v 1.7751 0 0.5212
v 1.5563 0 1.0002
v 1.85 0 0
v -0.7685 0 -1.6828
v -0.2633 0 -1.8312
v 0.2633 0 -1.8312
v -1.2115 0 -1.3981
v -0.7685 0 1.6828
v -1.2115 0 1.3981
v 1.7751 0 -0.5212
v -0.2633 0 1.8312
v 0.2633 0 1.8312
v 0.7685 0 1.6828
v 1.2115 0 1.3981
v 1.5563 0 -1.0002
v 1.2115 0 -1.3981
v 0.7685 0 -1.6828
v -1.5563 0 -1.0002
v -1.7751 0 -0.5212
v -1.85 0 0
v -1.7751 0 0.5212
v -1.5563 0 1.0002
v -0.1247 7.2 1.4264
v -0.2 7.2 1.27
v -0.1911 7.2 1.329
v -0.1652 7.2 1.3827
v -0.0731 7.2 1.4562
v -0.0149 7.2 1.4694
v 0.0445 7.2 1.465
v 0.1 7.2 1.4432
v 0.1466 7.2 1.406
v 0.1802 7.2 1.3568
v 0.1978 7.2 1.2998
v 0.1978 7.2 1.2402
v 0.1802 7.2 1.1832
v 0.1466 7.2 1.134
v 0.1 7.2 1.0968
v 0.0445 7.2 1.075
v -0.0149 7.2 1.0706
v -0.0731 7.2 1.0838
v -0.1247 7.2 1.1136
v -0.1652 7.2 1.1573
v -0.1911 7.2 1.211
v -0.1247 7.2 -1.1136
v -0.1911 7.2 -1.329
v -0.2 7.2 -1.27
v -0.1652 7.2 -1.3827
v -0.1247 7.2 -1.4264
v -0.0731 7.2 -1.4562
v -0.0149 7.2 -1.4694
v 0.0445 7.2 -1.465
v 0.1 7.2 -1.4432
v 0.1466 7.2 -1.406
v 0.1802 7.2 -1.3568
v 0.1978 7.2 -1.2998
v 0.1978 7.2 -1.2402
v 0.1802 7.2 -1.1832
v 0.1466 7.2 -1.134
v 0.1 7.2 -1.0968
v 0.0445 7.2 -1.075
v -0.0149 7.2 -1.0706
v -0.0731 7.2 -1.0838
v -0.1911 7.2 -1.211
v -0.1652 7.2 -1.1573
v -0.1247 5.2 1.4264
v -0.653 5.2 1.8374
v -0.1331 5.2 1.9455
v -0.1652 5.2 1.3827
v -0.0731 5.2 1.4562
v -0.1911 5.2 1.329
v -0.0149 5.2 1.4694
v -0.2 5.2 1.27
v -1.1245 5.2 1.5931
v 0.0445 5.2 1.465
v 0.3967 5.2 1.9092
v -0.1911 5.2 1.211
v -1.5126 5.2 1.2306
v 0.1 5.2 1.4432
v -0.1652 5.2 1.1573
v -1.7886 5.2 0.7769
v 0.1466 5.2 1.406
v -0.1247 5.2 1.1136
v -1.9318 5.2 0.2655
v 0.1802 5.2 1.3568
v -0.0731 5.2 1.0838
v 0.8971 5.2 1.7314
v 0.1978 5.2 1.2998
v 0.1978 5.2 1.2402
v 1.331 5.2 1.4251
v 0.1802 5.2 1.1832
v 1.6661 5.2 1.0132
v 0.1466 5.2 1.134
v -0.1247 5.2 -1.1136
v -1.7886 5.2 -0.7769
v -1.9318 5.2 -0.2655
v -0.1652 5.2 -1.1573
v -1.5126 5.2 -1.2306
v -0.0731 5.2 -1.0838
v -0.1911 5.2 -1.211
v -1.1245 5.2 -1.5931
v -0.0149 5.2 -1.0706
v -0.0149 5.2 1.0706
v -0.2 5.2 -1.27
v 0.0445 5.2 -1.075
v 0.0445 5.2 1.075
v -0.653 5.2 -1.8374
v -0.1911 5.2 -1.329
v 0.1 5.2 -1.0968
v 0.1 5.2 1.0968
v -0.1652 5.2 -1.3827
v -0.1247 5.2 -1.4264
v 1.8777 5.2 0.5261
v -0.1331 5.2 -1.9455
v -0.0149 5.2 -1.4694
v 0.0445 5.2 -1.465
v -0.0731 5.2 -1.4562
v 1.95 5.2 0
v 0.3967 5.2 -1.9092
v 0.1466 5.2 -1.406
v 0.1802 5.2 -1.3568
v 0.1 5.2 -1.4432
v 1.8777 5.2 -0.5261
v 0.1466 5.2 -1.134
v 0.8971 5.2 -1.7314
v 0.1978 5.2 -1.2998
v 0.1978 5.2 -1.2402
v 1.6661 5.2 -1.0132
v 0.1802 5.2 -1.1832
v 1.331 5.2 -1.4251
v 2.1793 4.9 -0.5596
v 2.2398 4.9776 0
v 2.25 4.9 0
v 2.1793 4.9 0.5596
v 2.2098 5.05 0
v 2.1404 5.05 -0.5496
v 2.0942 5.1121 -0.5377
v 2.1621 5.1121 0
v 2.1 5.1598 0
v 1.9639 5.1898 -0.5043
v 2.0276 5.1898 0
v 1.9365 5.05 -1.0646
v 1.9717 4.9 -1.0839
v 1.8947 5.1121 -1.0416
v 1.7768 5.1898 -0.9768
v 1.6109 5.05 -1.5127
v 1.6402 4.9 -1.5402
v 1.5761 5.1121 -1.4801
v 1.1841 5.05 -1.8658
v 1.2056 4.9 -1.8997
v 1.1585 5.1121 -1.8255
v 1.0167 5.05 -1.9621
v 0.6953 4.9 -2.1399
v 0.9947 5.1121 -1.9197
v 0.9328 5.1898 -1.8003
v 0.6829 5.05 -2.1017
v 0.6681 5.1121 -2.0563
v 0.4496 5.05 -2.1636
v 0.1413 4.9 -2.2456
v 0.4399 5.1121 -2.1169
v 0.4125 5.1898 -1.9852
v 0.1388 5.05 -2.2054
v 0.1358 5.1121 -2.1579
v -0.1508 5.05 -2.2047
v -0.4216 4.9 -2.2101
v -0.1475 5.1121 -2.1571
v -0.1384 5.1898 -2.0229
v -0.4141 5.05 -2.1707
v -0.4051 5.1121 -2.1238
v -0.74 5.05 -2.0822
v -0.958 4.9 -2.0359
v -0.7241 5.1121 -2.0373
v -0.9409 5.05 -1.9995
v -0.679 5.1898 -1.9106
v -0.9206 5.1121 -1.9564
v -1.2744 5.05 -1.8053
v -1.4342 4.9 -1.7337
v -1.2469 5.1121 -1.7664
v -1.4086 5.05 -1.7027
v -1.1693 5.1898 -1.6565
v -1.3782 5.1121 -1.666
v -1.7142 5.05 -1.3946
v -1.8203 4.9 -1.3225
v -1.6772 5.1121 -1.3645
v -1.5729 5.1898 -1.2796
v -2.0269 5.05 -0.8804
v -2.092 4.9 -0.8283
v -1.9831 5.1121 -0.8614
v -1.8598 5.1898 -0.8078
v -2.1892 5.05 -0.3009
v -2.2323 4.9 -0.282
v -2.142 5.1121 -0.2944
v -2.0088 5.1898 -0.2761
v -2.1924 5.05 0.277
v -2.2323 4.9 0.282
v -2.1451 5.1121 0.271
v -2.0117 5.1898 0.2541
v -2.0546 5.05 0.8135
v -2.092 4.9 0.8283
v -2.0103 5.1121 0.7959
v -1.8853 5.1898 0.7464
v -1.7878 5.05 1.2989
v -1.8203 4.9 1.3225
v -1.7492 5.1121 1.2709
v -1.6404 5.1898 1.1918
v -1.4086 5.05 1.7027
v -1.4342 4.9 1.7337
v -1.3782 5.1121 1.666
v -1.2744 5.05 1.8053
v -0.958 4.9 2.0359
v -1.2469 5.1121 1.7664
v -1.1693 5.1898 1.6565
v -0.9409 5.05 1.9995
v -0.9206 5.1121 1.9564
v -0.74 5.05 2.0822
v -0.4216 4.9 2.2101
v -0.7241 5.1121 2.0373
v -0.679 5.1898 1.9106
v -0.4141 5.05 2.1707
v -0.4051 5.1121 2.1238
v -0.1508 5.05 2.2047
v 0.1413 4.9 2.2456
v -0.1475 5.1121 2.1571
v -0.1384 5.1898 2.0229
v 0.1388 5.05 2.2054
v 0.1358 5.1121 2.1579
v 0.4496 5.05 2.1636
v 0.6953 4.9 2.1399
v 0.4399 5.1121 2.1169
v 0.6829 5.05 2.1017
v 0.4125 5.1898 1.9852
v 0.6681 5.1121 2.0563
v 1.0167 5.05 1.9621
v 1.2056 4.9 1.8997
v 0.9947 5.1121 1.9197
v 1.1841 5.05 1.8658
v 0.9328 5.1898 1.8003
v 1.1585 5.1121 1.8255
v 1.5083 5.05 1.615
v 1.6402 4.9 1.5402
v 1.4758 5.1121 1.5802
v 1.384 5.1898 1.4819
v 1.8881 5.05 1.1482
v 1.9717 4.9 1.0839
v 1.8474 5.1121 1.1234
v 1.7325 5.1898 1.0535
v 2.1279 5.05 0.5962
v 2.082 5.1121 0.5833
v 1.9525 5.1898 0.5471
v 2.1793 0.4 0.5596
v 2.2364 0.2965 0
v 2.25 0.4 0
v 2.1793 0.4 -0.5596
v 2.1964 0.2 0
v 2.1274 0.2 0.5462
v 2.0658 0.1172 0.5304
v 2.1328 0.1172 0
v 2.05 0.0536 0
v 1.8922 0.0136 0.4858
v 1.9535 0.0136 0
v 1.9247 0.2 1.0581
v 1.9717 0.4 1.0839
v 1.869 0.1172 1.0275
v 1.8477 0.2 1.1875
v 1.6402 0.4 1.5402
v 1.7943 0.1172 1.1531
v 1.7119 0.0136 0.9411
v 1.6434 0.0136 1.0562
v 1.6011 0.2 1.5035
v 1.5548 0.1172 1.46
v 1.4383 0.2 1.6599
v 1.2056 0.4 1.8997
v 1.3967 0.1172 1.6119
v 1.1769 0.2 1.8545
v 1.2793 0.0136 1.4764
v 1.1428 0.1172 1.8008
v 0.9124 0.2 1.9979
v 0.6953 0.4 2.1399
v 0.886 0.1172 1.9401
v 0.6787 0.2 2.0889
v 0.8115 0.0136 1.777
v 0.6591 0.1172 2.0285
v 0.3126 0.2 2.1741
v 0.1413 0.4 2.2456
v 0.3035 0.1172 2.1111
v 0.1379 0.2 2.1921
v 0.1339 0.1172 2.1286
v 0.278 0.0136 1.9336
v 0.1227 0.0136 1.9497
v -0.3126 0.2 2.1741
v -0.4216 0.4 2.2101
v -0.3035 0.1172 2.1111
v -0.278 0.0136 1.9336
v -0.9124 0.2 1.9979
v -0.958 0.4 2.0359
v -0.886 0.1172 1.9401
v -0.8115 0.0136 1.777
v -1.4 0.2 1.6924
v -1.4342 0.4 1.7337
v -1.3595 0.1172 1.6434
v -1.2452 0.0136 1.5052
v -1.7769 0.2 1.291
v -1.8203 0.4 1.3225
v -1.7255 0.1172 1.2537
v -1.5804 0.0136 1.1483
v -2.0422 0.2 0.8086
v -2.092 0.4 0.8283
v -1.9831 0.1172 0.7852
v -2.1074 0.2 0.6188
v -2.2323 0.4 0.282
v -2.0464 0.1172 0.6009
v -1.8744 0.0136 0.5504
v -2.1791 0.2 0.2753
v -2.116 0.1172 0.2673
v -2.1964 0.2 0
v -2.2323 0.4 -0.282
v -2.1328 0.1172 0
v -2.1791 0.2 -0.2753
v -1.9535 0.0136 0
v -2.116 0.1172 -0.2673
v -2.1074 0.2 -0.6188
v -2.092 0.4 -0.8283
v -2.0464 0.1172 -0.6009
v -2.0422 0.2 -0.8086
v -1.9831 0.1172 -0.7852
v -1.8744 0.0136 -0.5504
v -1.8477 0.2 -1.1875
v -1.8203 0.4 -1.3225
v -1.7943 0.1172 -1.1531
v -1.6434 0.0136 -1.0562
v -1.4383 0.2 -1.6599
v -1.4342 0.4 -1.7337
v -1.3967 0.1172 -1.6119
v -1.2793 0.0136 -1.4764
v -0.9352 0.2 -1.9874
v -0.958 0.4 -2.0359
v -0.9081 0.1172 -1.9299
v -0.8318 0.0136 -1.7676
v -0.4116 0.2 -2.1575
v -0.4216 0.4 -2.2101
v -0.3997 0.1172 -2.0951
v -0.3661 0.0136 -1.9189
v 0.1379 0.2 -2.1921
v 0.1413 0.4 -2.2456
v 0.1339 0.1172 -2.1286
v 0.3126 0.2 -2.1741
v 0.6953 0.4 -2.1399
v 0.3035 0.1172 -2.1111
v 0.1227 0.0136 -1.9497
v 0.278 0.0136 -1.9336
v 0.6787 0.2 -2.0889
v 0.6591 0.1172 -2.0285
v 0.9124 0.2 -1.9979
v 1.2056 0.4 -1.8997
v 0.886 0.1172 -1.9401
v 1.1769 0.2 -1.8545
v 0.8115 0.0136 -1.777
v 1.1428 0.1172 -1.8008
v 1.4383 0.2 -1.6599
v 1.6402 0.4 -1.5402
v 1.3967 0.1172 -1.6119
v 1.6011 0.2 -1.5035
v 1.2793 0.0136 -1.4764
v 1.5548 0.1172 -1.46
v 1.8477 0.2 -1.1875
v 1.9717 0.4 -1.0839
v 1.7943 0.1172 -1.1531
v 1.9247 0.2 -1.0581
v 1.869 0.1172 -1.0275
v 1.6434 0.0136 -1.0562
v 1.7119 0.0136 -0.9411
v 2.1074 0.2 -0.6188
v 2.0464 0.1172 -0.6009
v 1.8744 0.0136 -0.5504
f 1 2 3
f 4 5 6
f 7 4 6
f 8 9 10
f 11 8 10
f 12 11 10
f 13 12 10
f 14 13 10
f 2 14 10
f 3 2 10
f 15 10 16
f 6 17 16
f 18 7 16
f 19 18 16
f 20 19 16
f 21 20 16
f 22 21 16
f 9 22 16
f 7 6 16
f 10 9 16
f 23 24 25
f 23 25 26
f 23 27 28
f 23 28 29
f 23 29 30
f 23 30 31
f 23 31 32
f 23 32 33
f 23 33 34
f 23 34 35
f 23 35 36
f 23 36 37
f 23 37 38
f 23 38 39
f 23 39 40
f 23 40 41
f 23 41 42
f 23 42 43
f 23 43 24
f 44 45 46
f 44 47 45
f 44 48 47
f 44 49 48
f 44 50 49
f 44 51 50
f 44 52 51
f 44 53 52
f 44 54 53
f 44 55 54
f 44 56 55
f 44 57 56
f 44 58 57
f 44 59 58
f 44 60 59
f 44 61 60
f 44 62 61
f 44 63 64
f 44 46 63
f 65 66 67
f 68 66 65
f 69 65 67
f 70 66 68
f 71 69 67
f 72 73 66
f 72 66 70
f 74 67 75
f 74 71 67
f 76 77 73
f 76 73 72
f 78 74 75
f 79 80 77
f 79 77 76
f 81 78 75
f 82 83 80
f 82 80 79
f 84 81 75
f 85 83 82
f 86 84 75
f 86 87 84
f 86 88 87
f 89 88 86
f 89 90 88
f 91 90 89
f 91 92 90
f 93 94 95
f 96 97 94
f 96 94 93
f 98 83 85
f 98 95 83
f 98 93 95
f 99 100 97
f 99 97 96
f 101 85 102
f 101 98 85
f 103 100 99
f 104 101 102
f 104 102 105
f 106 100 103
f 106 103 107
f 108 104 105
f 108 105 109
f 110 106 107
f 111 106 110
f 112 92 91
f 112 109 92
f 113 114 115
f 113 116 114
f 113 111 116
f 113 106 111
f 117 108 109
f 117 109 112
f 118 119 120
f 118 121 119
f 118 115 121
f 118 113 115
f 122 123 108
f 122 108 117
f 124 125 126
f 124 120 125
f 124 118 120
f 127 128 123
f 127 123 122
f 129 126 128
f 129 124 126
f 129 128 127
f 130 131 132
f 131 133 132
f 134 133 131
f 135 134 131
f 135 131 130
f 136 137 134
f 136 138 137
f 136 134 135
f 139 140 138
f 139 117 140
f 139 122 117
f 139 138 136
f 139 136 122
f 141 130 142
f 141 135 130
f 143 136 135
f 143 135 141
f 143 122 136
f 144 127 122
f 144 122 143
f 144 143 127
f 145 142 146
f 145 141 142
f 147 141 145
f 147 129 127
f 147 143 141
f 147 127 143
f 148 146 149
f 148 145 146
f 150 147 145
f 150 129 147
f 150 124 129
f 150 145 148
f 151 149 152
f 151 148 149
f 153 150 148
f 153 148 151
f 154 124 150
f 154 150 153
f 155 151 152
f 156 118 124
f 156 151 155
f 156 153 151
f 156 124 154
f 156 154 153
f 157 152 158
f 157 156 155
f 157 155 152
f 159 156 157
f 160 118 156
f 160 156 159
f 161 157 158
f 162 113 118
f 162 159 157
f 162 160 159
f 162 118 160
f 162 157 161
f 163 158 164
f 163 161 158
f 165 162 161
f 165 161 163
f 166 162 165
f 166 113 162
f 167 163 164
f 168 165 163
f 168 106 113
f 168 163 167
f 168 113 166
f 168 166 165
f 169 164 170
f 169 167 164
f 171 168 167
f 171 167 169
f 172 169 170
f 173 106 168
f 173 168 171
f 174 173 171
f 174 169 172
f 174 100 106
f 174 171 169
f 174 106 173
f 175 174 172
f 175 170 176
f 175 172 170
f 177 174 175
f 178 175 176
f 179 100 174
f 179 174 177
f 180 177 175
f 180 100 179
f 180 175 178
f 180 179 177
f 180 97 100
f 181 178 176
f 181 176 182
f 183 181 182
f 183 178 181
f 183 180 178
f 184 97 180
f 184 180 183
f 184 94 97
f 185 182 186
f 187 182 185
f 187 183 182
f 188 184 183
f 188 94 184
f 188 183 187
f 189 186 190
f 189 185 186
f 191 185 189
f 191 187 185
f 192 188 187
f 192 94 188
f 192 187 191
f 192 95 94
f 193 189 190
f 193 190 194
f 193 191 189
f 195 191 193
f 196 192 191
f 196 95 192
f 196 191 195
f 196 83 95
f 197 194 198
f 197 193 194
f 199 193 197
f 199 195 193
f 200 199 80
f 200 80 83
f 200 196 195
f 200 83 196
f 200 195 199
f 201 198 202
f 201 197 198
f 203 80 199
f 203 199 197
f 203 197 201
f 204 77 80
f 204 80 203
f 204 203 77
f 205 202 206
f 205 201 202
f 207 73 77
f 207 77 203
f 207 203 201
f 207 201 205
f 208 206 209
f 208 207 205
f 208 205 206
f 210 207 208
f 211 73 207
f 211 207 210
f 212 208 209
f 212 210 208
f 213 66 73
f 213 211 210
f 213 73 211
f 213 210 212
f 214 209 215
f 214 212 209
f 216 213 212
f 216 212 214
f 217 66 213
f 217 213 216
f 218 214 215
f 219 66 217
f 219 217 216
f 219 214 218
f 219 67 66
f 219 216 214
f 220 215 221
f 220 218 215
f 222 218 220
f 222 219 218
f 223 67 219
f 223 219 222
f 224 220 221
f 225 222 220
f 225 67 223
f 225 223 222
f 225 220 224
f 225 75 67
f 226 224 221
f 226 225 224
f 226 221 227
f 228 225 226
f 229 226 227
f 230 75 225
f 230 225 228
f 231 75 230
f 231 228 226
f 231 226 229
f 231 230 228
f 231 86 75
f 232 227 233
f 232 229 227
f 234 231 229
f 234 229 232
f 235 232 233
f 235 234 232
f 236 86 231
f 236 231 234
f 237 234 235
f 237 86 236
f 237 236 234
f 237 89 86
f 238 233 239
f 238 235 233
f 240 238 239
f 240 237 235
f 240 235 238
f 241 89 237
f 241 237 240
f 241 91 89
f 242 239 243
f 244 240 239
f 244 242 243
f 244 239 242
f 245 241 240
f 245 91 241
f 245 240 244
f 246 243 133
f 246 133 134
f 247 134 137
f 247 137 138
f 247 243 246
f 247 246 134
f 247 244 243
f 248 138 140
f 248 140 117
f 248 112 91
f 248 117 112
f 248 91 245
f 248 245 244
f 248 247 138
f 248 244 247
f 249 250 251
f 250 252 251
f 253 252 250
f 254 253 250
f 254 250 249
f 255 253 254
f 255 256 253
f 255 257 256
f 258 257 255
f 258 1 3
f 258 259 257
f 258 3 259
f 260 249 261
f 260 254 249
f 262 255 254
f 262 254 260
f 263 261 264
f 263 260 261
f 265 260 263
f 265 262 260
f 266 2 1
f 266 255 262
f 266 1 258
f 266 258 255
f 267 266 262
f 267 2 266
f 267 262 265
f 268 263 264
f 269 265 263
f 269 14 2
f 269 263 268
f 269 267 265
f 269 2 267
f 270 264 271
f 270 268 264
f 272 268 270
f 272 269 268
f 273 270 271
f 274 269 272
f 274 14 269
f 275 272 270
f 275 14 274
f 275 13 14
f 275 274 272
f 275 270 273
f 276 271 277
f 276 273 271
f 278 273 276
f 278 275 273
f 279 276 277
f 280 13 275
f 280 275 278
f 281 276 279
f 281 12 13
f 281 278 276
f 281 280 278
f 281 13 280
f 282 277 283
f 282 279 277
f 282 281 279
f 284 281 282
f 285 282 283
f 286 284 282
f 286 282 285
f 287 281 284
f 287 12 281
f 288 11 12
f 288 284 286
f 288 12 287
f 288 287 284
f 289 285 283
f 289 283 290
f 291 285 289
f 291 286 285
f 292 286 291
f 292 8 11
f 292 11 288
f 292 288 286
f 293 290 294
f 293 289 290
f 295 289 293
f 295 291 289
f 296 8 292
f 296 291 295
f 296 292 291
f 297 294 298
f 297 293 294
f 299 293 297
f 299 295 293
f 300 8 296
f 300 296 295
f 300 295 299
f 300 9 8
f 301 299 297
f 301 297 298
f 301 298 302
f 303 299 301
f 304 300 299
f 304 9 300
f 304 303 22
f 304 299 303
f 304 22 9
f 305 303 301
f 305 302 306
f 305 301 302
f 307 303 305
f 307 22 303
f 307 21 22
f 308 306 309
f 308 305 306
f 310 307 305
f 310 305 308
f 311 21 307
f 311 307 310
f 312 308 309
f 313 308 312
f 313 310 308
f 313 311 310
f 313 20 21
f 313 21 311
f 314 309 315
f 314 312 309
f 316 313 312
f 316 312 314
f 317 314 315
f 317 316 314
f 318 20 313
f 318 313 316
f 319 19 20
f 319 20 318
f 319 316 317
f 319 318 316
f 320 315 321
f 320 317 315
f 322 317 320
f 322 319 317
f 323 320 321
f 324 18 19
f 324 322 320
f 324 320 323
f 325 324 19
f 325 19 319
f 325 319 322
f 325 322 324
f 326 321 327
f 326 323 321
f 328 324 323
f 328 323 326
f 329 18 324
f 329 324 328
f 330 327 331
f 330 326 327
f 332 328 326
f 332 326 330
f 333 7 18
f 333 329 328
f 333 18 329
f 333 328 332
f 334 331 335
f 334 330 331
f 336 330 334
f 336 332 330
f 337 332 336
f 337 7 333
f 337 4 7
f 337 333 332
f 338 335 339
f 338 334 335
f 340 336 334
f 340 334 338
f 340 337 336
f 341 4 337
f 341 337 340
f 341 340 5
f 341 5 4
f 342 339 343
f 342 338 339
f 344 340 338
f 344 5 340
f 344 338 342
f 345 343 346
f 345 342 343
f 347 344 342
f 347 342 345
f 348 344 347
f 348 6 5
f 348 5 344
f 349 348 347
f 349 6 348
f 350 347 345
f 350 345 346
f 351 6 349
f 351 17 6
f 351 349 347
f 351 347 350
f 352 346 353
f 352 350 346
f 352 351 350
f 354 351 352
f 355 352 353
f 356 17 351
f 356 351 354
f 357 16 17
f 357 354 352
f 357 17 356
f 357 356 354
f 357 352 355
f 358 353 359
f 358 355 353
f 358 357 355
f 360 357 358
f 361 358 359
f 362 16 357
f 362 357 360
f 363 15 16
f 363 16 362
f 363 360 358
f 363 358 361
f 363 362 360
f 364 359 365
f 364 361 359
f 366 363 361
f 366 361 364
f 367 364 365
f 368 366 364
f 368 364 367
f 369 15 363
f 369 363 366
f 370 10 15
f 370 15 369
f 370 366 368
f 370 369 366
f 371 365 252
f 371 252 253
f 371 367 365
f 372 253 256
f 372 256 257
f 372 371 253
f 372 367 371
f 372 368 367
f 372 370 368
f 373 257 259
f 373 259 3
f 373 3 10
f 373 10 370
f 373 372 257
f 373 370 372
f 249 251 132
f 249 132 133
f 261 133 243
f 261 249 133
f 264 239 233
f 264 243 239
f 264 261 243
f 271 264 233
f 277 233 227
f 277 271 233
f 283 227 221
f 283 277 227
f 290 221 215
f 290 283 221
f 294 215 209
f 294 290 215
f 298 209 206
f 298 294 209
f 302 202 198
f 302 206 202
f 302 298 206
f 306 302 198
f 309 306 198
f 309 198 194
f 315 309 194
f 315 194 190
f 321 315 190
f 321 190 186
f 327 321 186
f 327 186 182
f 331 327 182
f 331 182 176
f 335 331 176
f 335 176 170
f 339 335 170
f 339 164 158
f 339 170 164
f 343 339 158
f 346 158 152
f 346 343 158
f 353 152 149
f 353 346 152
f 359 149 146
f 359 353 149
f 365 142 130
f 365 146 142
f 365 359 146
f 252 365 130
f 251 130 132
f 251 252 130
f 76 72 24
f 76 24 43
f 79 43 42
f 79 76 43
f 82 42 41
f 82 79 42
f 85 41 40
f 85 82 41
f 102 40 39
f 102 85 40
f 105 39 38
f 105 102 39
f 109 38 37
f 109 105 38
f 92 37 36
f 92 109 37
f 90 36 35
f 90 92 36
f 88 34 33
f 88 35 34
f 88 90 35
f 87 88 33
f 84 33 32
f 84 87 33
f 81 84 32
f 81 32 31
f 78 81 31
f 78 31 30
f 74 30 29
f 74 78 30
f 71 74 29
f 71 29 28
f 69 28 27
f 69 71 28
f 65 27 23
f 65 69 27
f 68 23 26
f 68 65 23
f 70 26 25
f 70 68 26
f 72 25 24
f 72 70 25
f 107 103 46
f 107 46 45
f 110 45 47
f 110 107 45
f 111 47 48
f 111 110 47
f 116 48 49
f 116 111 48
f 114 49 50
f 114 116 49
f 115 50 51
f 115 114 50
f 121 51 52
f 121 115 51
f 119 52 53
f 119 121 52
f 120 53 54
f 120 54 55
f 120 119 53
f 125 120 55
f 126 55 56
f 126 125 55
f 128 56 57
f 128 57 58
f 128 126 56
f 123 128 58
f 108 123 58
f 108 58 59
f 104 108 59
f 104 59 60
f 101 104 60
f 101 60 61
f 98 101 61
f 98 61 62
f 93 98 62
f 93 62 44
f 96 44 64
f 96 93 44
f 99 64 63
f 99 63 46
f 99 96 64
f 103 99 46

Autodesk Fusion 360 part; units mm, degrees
sketch "Sketch1" plane through (0, 0, 0) normal (0, 1, 0) x (1, 0, 0)
  circle A0 centre (0, 0) radius 2.25
  dimension "d1" = 4.5
extrude "Extrude1" add sketch "Sketch1" along normal blind 5.2
sketch "Sketch2" plane through (0, 5.2, 0) normal (0, 1, 0) x (-1, 0, 0)
  circle A0 centre (0, 0) radius 2.25
  line L0 (0, 0) -> (0, -1.27)
  circle A1 centre (0, -1.27) radius 0.2
  line L1 (0, 0) -> (-0.6583, 0) construction
  circle A2 centre (0, 1.27) radius 0.2
  dimension "d4" = 1.27
  dimension "d6" = 0.4
extrude "Extrude2" add sketch "Sketch2" along normal blind 2 contours A1 | A2
fillet "Fillet1" radius 0.4 1 edges at (-2.0977, 0, 0.8136)
fillet "Fillet2" radius 0.3 1 edges at (-2.0977, 5.2, 0.8136)
sketch "Sketch3" plane through (0, 0, 0) normal (0, 0, 1) x (1, 0, 0)
equation "d4 = ( 2.54 / 2 ) * 1 mm"
